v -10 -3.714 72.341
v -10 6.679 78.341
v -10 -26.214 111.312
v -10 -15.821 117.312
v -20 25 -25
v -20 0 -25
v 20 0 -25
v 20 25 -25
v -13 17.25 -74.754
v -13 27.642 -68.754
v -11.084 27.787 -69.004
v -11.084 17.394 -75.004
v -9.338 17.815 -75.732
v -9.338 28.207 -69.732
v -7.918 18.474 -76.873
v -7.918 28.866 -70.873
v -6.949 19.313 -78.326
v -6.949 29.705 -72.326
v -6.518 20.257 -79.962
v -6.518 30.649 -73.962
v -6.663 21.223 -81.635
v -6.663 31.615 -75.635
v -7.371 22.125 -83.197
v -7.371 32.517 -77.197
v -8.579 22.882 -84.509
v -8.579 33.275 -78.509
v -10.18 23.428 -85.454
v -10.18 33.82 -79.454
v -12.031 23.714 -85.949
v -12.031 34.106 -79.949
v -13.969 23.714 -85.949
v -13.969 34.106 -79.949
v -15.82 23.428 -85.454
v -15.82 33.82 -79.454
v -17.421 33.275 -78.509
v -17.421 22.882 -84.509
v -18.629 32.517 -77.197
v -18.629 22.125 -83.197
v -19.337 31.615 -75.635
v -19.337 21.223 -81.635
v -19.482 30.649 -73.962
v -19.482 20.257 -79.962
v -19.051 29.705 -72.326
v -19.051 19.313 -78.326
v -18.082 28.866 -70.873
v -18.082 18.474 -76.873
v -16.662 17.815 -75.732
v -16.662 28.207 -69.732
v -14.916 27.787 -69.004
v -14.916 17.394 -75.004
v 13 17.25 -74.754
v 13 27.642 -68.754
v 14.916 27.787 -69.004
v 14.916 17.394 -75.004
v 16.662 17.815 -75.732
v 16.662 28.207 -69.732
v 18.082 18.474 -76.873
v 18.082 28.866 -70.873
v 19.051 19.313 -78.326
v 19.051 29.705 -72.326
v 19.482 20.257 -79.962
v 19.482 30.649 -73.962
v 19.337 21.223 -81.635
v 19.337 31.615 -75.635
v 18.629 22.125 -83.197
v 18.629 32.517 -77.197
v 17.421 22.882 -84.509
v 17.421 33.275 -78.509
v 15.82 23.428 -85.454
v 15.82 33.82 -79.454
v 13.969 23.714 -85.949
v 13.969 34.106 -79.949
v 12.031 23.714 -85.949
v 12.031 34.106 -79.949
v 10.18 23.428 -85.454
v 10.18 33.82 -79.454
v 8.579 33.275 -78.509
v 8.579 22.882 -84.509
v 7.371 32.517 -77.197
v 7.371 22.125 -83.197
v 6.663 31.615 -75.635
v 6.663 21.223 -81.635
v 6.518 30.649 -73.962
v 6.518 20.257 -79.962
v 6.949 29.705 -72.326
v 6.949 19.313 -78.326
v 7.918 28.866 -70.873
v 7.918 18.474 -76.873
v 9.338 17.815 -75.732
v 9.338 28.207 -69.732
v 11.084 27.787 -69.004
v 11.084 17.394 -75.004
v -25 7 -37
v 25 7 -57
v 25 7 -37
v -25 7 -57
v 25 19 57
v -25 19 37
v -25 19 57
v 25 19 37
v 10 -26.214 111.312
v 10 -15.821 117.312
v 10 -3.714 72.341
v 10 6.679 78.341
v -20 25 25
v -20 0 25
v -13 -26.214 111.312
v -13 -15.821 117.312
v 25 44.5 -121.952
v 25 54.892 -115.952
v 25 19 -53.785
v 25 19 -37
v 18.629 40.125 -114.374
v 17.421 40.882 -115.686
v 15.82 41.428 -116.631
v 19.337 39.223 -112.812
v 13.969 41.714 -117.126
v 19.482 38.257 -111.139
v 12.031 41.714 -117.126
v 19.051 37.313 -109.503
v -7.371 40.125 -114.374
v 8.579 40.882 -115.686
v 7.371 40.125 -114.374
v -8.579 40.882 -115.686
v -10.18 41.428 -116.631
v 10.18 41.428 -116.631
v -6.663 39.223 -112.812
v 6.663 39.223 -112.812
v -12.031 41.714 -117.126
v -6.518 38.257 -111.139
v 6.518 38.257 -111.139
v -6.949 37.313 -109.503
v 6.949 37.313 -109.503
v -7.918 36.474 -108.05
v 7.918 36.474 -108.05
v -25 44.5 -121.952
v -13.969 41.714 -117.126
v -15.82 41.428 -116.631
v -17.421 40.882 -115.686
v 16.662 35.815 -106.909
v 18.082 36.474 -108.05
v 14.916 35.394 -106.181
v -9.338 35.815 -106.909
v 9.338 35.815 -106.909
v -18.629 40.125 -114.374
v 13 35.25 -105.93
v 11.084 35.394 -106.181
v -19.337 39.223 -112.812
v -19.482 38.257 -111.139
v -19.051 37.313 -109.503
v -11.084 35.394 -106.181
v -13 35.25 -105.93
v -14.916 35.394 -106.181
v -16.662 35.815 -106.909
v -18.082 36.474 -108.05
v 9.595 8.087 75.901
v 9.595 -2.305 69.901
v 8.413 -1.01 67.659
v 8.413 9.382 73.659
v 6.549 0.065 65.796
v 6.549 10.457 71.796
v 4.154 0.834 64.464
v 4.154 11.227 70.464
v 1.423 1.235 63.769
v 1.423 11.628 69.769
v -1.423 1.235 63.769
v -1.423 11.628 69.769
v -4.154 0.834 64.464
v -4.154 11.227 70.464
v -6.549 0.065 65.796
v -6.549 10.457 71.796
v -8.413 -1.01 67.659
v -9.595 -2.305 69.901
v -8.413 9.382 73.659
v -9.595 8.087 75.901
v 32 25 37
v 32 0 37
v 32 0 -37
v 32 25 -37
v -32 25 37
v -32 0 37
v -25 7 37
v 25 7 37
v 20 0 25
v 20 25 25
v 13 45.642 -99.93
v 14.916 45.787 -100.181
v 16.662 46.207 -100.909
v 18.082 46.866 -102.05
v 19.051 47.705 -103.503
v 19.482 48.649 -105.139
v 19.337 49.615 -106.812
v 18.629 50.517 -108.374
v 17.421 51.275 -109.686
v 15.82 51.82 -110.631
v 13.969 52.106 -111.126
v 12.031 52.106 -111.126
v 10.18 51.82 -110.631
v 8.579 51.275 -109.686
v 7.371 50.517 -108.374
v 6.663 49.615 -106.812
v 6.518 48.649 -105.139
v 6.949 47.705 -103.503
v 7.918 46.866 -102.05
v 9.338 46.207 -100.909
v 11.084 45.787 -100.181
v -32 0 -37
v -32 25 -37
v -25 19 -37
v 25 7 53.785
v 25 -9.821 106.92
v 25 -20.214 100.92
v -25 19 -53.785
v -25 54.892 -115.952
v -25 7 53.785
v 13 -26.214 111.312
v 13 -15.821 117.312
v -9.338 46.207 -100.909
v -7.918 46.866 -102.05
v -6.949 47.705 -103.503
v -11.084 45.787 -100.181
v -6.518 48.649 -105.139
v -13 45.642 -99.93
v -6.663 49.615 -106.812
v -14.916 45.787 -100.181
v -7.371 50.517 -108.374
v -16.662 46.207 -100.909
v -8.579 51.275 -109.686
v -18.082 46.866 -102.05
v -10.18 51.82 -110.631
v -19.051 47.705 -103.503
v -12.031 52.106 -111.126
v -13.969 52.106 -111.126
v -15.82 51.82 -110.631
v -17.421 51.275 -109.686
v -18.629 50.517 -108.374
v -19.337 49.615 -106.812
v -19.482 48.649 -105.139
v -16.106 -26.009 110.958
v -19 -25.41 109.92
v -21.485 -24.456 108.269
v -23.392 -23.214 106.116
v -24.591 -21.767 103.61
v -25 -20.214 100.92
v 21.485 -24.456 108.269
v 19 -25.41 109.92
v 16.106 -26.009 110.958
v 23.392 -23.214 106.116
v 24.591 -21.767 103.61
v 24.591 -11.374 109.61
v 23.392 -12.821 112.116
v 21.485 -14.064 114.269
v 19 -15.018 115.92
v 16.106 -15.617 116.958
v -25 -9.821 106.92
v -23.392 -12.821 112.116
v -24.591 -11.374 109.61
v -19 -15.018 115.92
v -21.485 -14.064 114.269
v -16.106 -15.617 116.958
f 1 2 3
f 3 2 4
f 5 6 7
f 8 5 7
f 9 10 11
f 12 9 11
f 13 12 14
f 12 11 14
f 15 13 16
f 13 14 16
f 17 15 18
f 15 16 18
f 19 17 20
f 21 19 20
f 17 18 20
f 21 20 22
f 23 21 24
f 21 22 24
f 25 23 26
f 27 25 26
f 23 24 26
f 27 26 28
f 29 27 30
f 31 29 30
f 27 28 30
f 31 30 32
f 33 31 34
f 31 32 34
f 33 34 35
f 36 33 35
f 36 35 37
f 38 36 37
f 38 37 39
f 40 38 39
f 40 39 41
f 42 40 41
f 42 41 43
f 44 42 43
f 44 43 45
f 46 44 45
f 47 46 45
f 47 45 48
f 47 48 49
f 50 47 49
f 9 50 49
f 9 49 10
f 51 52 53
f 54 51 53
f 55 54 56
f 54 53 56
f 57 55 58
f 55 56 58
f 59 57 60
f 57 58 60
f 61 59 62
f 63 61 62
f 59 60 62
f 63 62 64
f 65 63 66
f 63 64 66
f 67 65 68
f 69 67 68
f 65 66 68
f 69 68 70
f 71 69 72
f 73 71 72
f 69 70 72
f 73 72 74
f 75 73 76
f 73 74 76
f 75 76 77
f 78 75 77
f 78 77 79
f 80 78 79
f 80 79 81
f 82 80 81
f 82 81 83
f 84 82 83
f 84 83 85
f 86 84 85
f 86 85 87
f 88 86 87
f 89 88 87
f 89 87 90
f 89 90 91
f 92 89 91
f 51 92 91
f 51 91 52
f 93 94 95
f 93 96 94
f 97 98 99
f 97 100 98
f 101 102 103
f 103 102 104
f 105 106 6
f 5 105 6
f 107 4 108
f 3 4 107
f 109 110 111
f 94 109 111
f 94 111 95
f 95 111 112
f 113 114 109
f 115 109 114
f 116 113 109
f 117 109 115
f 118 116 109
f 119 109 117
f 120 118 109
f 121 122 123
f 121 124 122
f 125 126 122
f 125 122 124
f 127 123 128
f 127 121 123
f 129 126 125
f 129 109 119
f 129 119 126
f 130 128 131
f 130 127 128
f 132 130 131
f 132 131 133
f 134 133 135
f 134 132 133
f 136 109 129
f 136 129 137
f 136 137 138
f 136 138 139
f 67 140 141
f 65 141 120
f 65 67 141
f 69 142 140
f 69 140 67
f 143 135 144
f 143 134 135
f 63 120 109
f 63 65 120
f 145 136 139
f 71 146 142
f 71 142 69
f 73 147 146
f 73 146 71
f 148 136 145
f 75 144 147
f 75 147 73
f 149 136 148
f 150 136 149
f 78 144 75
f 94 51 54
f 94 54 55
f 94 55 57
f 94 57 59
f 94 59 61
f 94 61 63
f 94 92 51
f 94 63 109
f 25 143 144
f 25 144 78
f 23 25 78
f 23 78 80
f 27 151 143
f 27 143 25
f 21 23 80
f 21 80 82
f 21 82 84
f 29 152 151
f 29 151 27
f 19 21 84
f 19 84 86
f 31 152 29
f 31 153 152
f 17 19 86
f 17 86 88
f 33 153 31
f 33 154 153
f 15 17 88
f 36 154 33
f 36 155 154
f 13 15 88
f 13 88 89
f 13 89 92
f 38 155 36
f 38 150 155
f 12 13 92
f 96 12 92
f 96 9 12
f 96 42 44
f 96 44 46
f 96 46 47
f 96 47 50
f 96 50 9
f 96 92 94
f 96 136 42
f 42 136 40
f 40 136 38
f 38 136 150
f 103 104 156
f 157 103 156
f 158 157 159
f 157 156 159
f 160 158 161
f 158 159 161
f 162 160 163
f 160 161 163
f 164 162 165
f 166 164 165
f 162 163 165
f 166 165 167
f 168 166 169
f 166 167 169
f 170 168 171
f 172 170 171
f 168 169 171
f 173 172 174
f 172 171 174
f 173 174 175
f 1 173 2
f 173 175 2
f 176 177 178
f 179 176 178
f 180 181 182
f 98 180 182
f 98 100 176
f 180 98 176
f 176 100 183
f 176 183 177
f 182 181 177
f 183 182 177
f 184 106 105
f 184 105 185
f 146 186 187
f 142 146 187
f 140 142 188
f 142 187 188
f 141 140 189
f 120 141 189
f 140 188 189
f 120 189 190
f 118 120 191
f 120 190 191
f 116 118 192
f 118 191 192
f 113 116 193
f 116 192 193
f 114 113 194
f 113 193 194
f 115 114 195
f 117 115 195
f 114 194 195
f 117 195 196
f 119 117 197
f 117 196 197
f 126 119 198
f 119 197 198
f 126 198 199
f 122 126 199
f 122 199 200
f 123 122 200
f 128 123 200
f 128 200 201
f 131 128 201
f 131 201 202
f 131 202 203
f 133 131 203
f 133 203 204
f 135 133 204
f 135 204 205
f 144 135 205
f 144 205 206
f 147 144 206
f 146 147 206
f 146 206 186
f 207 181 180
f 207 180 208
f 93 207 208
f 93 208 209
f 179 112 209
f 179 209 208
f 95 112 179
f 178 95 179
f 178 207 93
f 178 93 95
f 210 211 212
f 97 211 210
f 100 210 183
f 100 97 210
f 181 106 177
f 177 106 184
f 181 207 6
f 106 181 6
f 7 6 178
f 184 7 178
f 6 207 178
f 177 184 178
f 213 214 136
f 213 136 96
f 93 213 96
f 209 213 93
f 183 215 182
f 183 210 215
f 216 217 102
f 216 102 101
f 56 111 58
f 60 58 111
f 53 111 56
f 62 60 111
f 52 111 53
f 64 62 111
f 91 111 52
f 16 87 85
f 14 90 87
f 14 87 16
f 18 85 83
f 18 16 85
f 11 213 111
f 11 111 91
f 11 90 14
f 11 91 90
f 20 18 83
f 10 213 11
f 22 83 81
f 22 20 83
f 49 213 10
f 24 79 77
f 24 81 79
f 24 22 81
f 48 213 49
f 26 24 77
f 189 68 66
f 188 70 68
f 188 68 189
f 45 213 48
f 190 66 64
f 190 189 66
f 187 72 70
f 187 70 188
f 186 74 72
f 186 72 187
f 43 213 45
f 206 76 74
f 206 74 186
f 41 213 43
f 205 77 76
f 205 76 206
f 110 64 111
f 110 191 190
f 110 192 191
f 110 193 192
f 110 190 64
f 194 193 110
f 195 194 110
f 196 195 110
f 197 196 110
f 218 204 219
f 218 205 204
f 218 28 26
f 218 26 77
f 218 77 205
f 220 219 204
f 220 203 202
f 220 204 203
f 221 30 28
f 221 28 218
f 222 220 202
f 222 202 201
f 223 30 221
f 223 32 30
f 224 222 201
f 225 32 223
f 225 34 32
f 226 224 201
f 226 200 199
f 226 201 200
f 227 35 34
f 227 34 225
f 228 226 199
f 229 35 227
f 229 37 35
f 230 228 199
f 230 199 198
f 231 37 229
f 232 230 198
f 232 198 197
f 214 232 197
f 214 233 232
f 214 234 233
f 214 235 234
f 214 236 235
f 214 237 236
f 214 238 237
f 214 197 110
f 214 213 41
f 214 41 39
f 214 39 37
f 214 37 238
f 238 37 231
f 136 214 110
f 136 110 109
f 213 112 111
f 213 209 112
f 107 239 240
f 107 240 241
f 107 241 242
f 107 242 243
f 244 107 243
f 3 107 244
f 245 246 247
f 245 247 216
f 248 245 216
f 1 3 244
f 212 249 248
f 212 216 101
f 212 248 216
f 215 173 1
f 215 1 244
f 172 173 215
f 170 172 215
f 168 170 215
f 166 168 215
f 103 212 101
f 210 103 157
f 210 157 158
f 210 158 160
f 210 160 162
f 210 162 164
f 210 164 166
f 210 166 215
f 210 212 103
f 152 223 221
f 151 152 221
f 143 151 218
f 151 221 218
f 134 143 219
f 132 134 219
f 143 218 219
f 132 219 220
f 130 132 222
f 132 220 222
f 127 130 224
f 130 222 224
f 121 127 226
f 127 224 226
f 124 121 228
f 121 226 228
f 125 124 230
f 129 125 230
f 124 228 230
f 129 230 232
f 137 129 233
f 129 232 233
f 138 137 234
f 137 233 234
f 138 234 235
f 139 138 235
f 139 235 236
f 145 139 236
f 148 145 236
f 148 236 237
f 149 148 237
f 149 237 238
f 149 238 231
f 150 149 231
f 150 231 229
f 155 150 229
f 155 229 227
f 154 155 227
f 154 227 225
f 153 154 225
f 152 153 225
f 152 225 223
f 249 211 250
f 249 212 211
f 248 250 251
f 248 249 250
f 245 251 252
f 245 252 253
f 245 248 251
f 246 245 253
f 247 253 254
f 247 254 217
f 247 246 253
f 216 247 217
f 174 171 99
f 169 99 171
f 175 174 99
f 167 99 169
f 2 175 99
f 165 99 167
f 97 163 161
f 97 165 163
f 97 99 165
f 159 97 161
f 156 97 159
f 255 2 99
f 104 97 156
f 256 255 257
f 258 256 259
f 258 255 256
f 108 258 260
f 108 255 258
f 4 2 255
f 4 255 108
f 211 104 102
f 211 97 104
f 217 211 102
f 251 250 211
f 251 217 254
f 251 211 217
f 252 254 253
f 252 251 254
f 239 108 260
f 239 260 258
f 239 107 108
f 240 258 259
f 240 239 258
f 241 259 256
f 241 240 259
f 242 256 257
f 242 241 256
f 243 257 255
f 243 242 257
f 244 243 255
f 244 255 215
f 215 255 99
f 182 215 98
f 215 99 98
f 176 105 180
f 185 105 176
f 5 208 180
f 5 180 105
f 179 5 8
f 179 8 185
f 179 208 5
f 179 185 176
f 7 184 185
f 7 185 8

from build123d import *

# Parameters (mm, degrees)
CROQUIS1_W              = 64
CROQUIS1_H              = 74
CROQUIS1_W_2            = 40
CROQUIS1_H_2            = 50
SALIENTE_EXTRUIR2_DEPTH = 25
SALIENTE_EXTRUIR3_DEPTH = 25
CORTAR_EXTRUIR1_REACH   = 143.863
CROQUIS3_R              = 6.5
REDONDEO1_R             = 12
REDONDEO2_R             = 12
CORTAR_EXTRUIR2_REACH   = 163.641


with BuildPart() as part:
    # Croquis1 → Saliente-Extruir2 (new body)
    with BuildSketch(Plane(origin=(0, 0, 0), x_dir=(1, 0, 0), z_dir=(0, 1, 0))):
        Rectangle(CROQUIS1_W, CROQUIS1_H)
        Rectangle(CROQUIS1_W_2, CROQUIS1_H_2, mode=Mode.SUBTRACT)
    extrude(amount=SALIENTE_EXTRUIR2_DEPTH)

    # Croquis2 → Saliente-Extruir3 (add, symmetric)
    with BuildSketch(Plane(origin=(0, 0, 0), x_dir=(0, 0, -1), z_dir=(1, 0, 0))):
        Polygon((37, 19), (53.784609691, 19), (115.951905284, 54.892304845), (121.951905284, 44.5), (57, 7), (37, 7), align=None)
        Polygon((-37, 19), (-57, 19), (-117.312425174, -15.821394909), (-111.312425174, -26.213699755), (-53.784609691, 7), (-37, 7), align=None)
    extrude(amount=SALIENTE_EXTRUIR3_DEPTH, both=True)

    # Croquis3 → Cortar-Extruir1 (cut, up to next)
    with BuildSketch(Plane(origin=(0, -9.039419162, -5.218911087), x_dir=(1, 0, 0), z_dir=(0, 0.8660254037844378, 0.5000000000000016)), mode=Mode.PRIVATE) as cortar_extruir1_sk1:
        with Locations(Location((-13, 115.863448016, 0), (0, 0, 270))):
            Circle(CROQUIS3_R)
    cortar_extruir1_tool1 = extrude(cortar_extruir1_sk1.sketch, amount=-CORTAR_EXTRUIR1_REACH, mode=Mode.PRIVATE) & part.part
    # Croquis3 → Cortar-Extruir1 (cut, up to next)
    with BuildSketch(Plane(origin=(0, -9.039419162, -5.218911087), x_dir=(1, 0, 0), z_dir=(0, 0.8660254037844378, 0.5000000000000016)), mode=Mode.PRIVATE) as cortar_extruir1_sk2:
        with Locations(Location((13, 115.863448016, 0), (0, 0, 270))):
            Circle(CROQUIS3_R)
    cortar_extruir1_tool2 = extrude(cortar_extruir1_sk2.sketch, amount=-CORTAR_EXTRUIR1_REACH, mode=Mode.PRIVATE) & part.part
    # Croquis3 → Cortar-Extruir1 (cut, up to next)
    with BuildSketch(Plane(origin=(0, -9.039419162, -5.218911087), x_dir=(1, 0, 0), z_dir=(0, 0.8660254037844378, 0.5000000000000016)), mode=Mode.PRIVATE) as cortar_extruir1_sk3:
        with Locations(Location((-13, 79.863448016, 0), (0, 0, 270))):
            Circle(CROQUIS3_R)
    cortar_extruir1_tool3 = extrude(cortar_extruir1_sk3.sketch, amount=-CORTAR_EXTRUIR1_REACH, mode=Mode.PRIVATE) & part.part
    # Croquis3 → Cortar-Extruir1 (cut, up to next)
    with BuildSketch(Plane(origin=(0, -9.039419162, -5.218911087), x_dir=(1, 0, 0), z_dir=(0, 0.8660254037844378, 0.5000000000000016)), mode=Mode.PRIVATE) as cortar_extruir1_sk4:
        with Locations(Location((13, 79.863448016, 0), (0, 0, 270))):
            Circle(CROQUIS3_R)
    cortar_extruir1_tool4 = extrude(cortar_extruir1_sk4.sketch, amount=-CORTAR_EXTRUIR1_REACH, mode=Mode.PRIVATE) & part.part
    add(cortar_extruir1_tool1.solids().sort_by_distance((-13, 48.892305, -105.5596))[0], mode=Mode.SUBTRACT)
    add(cortar_extruir1_tool2.solids().sort_by_distance((13, 48.892305, -105.5596))[0], mode=Mode.SUBTRACT)
    add(cortar_extruir1_tool3.solids().sort_by_distance((-13, 30.892305, -74.382686))[0], mode=Mode.SUBTRACT)
    add(cortar_extruir1_tool4.solids().sort_by_distance((13, 30.892305, -74.382686))[0], mode=Mode.SUBTRACT)

    # Redondeo1
    redondeo1_edges = [part.edges().sort_by_distance(p)[0] for p in [
        (25, -21.017547332, 114.312425174),
    ]]
    fillet(redondeo1_edges, radius=REDONDEO1_R)

    # Redondeo2
    redondeo2_edges = [part.edges().sort_by_distance(p)[0] for p in [
        (-25, -21.017547332, 114.312425174),
    ]]
    fillet(redondeo2_edges, radius=REDONDEO2_R)

    # Croquis5 → Cortar-Extruir2 (cut, up to next)
    with BuildSketch(Plane(origin=(0, 38.931724008, 22.477241336), x_dir=(1, 0, 0), z_dir=(0, 0.8660254037844378, 0.5000000000000016)), mode=Mode.PRIVATE) as cortar_extruir2_sk1:
        with BuildLine():
            Line((-10, -64.506237835), (-10, -109.506237835))
            Line((-10, -109.506237835), (10, -109.506237835))
            Line((10, -109.506237835), (10, -64.506237835))
            ThreePointArc((10, -64.506237835), (0, -54.506237835), (-10, -64.506237835))
        make_face()
    cortar_extruir2_tool1 = extrude(cortar_extruir2_sk1.sketch, amount=-CORTAR_EXTRUIR2_REACH, mode=Mode.PRIVATE) & part.part
    add(cortar_extruir2_tool1.solids().sort_by_distance((0, -2.584336, 94.385167))[0], mode=Mode.SUBTRACT)


solid = part.part
